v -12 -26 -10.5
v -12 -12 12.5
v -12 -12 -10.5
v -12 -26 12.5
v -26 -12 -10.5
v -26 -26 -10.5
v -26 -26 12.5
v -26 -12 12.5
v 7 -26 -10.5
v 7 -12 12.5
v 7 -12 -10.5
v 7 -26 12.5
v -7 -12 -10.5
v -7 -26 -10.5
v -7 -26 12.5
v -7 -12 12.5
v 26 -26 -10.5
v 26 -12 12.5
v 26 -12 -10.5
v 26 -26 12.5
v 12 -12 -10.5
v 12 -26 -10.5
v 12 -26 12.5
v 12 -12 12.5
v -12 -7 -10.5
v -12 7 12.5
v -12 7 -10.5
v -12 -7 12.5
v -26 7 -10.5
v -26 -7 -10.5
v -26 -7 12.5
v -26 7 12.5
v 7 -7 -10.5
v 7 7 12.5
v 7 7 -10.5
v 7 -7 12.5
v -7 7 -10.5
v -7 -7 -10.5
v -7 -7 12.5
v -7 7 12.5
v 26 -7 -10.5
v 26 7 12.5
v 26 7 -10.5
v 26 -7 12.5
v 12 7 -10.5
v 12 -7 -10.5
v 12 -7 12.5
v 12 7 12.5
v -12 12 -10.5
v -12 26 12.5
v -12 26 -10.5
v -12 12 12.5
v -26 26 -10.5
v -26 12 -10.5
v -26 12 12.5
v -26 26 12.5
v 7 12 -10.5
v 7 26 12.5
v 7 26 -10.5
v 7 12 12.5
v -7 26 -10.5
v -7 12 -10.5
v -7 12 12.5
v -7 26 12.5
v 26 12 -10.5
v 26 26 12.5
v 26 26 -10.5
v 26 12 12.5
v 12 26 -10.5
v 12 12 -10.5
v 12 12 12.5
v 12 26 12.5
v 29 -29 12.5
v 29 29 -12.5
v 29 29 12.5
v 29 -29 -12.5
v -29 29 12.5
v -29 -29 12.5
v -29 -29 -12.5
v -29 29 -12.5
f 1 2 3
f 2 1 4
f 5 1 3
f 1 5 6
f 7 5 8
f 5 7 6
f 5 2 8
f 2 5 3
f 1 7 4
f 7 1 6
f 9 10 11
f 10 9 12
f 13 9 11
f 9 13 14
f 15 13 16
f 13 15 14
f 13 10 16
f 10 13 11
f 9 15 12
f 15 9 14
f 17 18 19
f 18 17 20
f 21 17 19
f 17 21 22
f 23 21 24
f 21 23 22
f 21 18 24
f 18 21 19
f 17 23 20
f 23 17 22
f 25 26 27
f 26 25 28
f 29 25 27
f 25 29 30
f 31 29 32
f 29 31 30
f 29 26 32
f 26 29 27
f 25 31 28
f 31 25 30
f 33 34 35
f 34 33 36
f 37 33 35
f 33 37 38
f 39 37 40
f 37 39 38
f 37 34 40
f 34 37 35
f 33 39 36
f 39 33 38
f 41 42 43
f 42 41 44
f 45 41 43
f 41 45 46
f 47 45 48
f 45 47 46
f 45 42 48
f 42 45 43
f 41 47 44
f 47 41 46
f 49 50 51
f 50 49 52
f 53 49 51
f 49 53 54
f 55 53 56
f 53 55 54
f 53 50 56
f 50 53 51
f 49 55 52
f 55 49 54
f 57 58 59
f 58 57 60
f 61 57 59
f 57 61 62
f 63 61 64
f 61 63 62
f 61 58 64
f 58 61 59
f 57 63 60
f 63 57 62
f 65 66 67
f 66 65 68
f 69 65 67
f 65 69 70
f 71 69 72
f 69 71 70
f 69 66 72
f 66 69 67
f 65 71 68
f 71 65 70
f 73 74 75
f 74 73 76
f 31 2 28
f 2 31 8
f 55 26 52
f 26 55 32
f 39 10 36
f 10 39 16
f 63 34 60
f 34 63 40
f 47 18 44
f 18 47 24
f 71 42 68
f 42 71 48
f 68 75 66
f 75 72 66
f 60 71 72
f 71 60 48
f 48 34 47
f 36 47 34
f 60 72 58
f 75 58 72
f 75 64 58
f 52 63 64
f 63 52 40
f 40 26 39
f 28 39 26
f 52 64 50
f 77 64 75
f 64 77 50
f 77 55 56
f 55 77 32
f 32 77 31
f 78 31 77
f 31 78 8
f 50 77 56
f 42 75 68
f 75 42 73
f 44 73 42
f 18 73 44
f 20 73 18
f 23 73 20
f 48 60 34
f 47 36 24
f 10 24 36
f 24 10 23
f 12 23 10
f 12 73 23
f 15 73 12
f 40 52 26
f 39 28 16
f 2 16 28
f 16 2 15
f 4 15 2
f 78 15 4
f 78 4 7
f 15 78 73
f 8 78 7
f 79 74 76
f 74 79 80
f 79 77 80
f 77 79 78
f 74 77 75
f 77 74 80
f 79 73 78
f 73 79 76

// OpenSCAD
$fn = 32;

// ----------------------------------------------------------------------
// Pocket plate 58 x 58 x 25
// 3 x 3 pockets 14 mm square, 23 mm deep
// ----------------------------------------------------------------------

// --- parameters (mm) ---
thickness = 25;  // plate thickness
floor_t = 2;     // material left under each pocket
pocket = 14;     // pocket side length
pitch_x = 19;    // pocket pitch along X
pitch_y = 19;    // pocket pitch along Y
cols = 3;        // pockets per row
rows = 3;        // rows of pockets

// --- derived feature positions (mm) ---
depth = thickness - floor_t;        // = 23   pocket depth, down to the floor
span_x = (cols - 1) * pitch_x;      // = 38   distance between outer pockets
span_y = (rows - 1) * pitch_y;      // = 38   distance between outer pocket rows
origin_x = -span_x / 2;             // = -19   X of the first pocket
origin_y = -span_y / 2;             // = -19   Y of the first pocket
plate = [span_x + pocket + 6, span_y + pocket + 6, thickness];  // = [58, 58, 25]   overall size: pockets plus 3 mm of wall on each side
feature_centers = [
  [origin_x + 0 * pitch_x, origin_y + 0 * pitch_y],
  [origin_x + 1 * pitch_x, origin_y + 0 * pitch_y],
  [origin_x + 2 * pitch_x, origin_y + 0 * pitch_y],
  [origin_x + 0 * pitch_x, origin_y + 1 * pitch_y],
  [origin_x + 1 * pitch_x, origin_y + 1 * pitch_y],
  [origin_x + 2 * pitch_x, origin_y + 1 * pitch_y],
  [origin_x + 0 * pitch_x, origin_y + 2 * pitch_y],
  [origin_x + 1 * pitch_x, origin_y + 2 * pitch_y],
  [origin_x + 2 * pitch_x, origin_y + 2 * pitch_y]
];   // pocket centres, used verbatim by the cutter loop

// plate outline, then one pocket per centre in feature_centers
difference() {
  cube(plate, center = true);
  for (centre = feature_centers)
    translate([centre[0] - pocket / 2, centre[1] - pocket / 2, plate[2] / 2 - depth])
      cube([pocket, pocket, depth + 1]);  // centred on the declared pocket centre
}
